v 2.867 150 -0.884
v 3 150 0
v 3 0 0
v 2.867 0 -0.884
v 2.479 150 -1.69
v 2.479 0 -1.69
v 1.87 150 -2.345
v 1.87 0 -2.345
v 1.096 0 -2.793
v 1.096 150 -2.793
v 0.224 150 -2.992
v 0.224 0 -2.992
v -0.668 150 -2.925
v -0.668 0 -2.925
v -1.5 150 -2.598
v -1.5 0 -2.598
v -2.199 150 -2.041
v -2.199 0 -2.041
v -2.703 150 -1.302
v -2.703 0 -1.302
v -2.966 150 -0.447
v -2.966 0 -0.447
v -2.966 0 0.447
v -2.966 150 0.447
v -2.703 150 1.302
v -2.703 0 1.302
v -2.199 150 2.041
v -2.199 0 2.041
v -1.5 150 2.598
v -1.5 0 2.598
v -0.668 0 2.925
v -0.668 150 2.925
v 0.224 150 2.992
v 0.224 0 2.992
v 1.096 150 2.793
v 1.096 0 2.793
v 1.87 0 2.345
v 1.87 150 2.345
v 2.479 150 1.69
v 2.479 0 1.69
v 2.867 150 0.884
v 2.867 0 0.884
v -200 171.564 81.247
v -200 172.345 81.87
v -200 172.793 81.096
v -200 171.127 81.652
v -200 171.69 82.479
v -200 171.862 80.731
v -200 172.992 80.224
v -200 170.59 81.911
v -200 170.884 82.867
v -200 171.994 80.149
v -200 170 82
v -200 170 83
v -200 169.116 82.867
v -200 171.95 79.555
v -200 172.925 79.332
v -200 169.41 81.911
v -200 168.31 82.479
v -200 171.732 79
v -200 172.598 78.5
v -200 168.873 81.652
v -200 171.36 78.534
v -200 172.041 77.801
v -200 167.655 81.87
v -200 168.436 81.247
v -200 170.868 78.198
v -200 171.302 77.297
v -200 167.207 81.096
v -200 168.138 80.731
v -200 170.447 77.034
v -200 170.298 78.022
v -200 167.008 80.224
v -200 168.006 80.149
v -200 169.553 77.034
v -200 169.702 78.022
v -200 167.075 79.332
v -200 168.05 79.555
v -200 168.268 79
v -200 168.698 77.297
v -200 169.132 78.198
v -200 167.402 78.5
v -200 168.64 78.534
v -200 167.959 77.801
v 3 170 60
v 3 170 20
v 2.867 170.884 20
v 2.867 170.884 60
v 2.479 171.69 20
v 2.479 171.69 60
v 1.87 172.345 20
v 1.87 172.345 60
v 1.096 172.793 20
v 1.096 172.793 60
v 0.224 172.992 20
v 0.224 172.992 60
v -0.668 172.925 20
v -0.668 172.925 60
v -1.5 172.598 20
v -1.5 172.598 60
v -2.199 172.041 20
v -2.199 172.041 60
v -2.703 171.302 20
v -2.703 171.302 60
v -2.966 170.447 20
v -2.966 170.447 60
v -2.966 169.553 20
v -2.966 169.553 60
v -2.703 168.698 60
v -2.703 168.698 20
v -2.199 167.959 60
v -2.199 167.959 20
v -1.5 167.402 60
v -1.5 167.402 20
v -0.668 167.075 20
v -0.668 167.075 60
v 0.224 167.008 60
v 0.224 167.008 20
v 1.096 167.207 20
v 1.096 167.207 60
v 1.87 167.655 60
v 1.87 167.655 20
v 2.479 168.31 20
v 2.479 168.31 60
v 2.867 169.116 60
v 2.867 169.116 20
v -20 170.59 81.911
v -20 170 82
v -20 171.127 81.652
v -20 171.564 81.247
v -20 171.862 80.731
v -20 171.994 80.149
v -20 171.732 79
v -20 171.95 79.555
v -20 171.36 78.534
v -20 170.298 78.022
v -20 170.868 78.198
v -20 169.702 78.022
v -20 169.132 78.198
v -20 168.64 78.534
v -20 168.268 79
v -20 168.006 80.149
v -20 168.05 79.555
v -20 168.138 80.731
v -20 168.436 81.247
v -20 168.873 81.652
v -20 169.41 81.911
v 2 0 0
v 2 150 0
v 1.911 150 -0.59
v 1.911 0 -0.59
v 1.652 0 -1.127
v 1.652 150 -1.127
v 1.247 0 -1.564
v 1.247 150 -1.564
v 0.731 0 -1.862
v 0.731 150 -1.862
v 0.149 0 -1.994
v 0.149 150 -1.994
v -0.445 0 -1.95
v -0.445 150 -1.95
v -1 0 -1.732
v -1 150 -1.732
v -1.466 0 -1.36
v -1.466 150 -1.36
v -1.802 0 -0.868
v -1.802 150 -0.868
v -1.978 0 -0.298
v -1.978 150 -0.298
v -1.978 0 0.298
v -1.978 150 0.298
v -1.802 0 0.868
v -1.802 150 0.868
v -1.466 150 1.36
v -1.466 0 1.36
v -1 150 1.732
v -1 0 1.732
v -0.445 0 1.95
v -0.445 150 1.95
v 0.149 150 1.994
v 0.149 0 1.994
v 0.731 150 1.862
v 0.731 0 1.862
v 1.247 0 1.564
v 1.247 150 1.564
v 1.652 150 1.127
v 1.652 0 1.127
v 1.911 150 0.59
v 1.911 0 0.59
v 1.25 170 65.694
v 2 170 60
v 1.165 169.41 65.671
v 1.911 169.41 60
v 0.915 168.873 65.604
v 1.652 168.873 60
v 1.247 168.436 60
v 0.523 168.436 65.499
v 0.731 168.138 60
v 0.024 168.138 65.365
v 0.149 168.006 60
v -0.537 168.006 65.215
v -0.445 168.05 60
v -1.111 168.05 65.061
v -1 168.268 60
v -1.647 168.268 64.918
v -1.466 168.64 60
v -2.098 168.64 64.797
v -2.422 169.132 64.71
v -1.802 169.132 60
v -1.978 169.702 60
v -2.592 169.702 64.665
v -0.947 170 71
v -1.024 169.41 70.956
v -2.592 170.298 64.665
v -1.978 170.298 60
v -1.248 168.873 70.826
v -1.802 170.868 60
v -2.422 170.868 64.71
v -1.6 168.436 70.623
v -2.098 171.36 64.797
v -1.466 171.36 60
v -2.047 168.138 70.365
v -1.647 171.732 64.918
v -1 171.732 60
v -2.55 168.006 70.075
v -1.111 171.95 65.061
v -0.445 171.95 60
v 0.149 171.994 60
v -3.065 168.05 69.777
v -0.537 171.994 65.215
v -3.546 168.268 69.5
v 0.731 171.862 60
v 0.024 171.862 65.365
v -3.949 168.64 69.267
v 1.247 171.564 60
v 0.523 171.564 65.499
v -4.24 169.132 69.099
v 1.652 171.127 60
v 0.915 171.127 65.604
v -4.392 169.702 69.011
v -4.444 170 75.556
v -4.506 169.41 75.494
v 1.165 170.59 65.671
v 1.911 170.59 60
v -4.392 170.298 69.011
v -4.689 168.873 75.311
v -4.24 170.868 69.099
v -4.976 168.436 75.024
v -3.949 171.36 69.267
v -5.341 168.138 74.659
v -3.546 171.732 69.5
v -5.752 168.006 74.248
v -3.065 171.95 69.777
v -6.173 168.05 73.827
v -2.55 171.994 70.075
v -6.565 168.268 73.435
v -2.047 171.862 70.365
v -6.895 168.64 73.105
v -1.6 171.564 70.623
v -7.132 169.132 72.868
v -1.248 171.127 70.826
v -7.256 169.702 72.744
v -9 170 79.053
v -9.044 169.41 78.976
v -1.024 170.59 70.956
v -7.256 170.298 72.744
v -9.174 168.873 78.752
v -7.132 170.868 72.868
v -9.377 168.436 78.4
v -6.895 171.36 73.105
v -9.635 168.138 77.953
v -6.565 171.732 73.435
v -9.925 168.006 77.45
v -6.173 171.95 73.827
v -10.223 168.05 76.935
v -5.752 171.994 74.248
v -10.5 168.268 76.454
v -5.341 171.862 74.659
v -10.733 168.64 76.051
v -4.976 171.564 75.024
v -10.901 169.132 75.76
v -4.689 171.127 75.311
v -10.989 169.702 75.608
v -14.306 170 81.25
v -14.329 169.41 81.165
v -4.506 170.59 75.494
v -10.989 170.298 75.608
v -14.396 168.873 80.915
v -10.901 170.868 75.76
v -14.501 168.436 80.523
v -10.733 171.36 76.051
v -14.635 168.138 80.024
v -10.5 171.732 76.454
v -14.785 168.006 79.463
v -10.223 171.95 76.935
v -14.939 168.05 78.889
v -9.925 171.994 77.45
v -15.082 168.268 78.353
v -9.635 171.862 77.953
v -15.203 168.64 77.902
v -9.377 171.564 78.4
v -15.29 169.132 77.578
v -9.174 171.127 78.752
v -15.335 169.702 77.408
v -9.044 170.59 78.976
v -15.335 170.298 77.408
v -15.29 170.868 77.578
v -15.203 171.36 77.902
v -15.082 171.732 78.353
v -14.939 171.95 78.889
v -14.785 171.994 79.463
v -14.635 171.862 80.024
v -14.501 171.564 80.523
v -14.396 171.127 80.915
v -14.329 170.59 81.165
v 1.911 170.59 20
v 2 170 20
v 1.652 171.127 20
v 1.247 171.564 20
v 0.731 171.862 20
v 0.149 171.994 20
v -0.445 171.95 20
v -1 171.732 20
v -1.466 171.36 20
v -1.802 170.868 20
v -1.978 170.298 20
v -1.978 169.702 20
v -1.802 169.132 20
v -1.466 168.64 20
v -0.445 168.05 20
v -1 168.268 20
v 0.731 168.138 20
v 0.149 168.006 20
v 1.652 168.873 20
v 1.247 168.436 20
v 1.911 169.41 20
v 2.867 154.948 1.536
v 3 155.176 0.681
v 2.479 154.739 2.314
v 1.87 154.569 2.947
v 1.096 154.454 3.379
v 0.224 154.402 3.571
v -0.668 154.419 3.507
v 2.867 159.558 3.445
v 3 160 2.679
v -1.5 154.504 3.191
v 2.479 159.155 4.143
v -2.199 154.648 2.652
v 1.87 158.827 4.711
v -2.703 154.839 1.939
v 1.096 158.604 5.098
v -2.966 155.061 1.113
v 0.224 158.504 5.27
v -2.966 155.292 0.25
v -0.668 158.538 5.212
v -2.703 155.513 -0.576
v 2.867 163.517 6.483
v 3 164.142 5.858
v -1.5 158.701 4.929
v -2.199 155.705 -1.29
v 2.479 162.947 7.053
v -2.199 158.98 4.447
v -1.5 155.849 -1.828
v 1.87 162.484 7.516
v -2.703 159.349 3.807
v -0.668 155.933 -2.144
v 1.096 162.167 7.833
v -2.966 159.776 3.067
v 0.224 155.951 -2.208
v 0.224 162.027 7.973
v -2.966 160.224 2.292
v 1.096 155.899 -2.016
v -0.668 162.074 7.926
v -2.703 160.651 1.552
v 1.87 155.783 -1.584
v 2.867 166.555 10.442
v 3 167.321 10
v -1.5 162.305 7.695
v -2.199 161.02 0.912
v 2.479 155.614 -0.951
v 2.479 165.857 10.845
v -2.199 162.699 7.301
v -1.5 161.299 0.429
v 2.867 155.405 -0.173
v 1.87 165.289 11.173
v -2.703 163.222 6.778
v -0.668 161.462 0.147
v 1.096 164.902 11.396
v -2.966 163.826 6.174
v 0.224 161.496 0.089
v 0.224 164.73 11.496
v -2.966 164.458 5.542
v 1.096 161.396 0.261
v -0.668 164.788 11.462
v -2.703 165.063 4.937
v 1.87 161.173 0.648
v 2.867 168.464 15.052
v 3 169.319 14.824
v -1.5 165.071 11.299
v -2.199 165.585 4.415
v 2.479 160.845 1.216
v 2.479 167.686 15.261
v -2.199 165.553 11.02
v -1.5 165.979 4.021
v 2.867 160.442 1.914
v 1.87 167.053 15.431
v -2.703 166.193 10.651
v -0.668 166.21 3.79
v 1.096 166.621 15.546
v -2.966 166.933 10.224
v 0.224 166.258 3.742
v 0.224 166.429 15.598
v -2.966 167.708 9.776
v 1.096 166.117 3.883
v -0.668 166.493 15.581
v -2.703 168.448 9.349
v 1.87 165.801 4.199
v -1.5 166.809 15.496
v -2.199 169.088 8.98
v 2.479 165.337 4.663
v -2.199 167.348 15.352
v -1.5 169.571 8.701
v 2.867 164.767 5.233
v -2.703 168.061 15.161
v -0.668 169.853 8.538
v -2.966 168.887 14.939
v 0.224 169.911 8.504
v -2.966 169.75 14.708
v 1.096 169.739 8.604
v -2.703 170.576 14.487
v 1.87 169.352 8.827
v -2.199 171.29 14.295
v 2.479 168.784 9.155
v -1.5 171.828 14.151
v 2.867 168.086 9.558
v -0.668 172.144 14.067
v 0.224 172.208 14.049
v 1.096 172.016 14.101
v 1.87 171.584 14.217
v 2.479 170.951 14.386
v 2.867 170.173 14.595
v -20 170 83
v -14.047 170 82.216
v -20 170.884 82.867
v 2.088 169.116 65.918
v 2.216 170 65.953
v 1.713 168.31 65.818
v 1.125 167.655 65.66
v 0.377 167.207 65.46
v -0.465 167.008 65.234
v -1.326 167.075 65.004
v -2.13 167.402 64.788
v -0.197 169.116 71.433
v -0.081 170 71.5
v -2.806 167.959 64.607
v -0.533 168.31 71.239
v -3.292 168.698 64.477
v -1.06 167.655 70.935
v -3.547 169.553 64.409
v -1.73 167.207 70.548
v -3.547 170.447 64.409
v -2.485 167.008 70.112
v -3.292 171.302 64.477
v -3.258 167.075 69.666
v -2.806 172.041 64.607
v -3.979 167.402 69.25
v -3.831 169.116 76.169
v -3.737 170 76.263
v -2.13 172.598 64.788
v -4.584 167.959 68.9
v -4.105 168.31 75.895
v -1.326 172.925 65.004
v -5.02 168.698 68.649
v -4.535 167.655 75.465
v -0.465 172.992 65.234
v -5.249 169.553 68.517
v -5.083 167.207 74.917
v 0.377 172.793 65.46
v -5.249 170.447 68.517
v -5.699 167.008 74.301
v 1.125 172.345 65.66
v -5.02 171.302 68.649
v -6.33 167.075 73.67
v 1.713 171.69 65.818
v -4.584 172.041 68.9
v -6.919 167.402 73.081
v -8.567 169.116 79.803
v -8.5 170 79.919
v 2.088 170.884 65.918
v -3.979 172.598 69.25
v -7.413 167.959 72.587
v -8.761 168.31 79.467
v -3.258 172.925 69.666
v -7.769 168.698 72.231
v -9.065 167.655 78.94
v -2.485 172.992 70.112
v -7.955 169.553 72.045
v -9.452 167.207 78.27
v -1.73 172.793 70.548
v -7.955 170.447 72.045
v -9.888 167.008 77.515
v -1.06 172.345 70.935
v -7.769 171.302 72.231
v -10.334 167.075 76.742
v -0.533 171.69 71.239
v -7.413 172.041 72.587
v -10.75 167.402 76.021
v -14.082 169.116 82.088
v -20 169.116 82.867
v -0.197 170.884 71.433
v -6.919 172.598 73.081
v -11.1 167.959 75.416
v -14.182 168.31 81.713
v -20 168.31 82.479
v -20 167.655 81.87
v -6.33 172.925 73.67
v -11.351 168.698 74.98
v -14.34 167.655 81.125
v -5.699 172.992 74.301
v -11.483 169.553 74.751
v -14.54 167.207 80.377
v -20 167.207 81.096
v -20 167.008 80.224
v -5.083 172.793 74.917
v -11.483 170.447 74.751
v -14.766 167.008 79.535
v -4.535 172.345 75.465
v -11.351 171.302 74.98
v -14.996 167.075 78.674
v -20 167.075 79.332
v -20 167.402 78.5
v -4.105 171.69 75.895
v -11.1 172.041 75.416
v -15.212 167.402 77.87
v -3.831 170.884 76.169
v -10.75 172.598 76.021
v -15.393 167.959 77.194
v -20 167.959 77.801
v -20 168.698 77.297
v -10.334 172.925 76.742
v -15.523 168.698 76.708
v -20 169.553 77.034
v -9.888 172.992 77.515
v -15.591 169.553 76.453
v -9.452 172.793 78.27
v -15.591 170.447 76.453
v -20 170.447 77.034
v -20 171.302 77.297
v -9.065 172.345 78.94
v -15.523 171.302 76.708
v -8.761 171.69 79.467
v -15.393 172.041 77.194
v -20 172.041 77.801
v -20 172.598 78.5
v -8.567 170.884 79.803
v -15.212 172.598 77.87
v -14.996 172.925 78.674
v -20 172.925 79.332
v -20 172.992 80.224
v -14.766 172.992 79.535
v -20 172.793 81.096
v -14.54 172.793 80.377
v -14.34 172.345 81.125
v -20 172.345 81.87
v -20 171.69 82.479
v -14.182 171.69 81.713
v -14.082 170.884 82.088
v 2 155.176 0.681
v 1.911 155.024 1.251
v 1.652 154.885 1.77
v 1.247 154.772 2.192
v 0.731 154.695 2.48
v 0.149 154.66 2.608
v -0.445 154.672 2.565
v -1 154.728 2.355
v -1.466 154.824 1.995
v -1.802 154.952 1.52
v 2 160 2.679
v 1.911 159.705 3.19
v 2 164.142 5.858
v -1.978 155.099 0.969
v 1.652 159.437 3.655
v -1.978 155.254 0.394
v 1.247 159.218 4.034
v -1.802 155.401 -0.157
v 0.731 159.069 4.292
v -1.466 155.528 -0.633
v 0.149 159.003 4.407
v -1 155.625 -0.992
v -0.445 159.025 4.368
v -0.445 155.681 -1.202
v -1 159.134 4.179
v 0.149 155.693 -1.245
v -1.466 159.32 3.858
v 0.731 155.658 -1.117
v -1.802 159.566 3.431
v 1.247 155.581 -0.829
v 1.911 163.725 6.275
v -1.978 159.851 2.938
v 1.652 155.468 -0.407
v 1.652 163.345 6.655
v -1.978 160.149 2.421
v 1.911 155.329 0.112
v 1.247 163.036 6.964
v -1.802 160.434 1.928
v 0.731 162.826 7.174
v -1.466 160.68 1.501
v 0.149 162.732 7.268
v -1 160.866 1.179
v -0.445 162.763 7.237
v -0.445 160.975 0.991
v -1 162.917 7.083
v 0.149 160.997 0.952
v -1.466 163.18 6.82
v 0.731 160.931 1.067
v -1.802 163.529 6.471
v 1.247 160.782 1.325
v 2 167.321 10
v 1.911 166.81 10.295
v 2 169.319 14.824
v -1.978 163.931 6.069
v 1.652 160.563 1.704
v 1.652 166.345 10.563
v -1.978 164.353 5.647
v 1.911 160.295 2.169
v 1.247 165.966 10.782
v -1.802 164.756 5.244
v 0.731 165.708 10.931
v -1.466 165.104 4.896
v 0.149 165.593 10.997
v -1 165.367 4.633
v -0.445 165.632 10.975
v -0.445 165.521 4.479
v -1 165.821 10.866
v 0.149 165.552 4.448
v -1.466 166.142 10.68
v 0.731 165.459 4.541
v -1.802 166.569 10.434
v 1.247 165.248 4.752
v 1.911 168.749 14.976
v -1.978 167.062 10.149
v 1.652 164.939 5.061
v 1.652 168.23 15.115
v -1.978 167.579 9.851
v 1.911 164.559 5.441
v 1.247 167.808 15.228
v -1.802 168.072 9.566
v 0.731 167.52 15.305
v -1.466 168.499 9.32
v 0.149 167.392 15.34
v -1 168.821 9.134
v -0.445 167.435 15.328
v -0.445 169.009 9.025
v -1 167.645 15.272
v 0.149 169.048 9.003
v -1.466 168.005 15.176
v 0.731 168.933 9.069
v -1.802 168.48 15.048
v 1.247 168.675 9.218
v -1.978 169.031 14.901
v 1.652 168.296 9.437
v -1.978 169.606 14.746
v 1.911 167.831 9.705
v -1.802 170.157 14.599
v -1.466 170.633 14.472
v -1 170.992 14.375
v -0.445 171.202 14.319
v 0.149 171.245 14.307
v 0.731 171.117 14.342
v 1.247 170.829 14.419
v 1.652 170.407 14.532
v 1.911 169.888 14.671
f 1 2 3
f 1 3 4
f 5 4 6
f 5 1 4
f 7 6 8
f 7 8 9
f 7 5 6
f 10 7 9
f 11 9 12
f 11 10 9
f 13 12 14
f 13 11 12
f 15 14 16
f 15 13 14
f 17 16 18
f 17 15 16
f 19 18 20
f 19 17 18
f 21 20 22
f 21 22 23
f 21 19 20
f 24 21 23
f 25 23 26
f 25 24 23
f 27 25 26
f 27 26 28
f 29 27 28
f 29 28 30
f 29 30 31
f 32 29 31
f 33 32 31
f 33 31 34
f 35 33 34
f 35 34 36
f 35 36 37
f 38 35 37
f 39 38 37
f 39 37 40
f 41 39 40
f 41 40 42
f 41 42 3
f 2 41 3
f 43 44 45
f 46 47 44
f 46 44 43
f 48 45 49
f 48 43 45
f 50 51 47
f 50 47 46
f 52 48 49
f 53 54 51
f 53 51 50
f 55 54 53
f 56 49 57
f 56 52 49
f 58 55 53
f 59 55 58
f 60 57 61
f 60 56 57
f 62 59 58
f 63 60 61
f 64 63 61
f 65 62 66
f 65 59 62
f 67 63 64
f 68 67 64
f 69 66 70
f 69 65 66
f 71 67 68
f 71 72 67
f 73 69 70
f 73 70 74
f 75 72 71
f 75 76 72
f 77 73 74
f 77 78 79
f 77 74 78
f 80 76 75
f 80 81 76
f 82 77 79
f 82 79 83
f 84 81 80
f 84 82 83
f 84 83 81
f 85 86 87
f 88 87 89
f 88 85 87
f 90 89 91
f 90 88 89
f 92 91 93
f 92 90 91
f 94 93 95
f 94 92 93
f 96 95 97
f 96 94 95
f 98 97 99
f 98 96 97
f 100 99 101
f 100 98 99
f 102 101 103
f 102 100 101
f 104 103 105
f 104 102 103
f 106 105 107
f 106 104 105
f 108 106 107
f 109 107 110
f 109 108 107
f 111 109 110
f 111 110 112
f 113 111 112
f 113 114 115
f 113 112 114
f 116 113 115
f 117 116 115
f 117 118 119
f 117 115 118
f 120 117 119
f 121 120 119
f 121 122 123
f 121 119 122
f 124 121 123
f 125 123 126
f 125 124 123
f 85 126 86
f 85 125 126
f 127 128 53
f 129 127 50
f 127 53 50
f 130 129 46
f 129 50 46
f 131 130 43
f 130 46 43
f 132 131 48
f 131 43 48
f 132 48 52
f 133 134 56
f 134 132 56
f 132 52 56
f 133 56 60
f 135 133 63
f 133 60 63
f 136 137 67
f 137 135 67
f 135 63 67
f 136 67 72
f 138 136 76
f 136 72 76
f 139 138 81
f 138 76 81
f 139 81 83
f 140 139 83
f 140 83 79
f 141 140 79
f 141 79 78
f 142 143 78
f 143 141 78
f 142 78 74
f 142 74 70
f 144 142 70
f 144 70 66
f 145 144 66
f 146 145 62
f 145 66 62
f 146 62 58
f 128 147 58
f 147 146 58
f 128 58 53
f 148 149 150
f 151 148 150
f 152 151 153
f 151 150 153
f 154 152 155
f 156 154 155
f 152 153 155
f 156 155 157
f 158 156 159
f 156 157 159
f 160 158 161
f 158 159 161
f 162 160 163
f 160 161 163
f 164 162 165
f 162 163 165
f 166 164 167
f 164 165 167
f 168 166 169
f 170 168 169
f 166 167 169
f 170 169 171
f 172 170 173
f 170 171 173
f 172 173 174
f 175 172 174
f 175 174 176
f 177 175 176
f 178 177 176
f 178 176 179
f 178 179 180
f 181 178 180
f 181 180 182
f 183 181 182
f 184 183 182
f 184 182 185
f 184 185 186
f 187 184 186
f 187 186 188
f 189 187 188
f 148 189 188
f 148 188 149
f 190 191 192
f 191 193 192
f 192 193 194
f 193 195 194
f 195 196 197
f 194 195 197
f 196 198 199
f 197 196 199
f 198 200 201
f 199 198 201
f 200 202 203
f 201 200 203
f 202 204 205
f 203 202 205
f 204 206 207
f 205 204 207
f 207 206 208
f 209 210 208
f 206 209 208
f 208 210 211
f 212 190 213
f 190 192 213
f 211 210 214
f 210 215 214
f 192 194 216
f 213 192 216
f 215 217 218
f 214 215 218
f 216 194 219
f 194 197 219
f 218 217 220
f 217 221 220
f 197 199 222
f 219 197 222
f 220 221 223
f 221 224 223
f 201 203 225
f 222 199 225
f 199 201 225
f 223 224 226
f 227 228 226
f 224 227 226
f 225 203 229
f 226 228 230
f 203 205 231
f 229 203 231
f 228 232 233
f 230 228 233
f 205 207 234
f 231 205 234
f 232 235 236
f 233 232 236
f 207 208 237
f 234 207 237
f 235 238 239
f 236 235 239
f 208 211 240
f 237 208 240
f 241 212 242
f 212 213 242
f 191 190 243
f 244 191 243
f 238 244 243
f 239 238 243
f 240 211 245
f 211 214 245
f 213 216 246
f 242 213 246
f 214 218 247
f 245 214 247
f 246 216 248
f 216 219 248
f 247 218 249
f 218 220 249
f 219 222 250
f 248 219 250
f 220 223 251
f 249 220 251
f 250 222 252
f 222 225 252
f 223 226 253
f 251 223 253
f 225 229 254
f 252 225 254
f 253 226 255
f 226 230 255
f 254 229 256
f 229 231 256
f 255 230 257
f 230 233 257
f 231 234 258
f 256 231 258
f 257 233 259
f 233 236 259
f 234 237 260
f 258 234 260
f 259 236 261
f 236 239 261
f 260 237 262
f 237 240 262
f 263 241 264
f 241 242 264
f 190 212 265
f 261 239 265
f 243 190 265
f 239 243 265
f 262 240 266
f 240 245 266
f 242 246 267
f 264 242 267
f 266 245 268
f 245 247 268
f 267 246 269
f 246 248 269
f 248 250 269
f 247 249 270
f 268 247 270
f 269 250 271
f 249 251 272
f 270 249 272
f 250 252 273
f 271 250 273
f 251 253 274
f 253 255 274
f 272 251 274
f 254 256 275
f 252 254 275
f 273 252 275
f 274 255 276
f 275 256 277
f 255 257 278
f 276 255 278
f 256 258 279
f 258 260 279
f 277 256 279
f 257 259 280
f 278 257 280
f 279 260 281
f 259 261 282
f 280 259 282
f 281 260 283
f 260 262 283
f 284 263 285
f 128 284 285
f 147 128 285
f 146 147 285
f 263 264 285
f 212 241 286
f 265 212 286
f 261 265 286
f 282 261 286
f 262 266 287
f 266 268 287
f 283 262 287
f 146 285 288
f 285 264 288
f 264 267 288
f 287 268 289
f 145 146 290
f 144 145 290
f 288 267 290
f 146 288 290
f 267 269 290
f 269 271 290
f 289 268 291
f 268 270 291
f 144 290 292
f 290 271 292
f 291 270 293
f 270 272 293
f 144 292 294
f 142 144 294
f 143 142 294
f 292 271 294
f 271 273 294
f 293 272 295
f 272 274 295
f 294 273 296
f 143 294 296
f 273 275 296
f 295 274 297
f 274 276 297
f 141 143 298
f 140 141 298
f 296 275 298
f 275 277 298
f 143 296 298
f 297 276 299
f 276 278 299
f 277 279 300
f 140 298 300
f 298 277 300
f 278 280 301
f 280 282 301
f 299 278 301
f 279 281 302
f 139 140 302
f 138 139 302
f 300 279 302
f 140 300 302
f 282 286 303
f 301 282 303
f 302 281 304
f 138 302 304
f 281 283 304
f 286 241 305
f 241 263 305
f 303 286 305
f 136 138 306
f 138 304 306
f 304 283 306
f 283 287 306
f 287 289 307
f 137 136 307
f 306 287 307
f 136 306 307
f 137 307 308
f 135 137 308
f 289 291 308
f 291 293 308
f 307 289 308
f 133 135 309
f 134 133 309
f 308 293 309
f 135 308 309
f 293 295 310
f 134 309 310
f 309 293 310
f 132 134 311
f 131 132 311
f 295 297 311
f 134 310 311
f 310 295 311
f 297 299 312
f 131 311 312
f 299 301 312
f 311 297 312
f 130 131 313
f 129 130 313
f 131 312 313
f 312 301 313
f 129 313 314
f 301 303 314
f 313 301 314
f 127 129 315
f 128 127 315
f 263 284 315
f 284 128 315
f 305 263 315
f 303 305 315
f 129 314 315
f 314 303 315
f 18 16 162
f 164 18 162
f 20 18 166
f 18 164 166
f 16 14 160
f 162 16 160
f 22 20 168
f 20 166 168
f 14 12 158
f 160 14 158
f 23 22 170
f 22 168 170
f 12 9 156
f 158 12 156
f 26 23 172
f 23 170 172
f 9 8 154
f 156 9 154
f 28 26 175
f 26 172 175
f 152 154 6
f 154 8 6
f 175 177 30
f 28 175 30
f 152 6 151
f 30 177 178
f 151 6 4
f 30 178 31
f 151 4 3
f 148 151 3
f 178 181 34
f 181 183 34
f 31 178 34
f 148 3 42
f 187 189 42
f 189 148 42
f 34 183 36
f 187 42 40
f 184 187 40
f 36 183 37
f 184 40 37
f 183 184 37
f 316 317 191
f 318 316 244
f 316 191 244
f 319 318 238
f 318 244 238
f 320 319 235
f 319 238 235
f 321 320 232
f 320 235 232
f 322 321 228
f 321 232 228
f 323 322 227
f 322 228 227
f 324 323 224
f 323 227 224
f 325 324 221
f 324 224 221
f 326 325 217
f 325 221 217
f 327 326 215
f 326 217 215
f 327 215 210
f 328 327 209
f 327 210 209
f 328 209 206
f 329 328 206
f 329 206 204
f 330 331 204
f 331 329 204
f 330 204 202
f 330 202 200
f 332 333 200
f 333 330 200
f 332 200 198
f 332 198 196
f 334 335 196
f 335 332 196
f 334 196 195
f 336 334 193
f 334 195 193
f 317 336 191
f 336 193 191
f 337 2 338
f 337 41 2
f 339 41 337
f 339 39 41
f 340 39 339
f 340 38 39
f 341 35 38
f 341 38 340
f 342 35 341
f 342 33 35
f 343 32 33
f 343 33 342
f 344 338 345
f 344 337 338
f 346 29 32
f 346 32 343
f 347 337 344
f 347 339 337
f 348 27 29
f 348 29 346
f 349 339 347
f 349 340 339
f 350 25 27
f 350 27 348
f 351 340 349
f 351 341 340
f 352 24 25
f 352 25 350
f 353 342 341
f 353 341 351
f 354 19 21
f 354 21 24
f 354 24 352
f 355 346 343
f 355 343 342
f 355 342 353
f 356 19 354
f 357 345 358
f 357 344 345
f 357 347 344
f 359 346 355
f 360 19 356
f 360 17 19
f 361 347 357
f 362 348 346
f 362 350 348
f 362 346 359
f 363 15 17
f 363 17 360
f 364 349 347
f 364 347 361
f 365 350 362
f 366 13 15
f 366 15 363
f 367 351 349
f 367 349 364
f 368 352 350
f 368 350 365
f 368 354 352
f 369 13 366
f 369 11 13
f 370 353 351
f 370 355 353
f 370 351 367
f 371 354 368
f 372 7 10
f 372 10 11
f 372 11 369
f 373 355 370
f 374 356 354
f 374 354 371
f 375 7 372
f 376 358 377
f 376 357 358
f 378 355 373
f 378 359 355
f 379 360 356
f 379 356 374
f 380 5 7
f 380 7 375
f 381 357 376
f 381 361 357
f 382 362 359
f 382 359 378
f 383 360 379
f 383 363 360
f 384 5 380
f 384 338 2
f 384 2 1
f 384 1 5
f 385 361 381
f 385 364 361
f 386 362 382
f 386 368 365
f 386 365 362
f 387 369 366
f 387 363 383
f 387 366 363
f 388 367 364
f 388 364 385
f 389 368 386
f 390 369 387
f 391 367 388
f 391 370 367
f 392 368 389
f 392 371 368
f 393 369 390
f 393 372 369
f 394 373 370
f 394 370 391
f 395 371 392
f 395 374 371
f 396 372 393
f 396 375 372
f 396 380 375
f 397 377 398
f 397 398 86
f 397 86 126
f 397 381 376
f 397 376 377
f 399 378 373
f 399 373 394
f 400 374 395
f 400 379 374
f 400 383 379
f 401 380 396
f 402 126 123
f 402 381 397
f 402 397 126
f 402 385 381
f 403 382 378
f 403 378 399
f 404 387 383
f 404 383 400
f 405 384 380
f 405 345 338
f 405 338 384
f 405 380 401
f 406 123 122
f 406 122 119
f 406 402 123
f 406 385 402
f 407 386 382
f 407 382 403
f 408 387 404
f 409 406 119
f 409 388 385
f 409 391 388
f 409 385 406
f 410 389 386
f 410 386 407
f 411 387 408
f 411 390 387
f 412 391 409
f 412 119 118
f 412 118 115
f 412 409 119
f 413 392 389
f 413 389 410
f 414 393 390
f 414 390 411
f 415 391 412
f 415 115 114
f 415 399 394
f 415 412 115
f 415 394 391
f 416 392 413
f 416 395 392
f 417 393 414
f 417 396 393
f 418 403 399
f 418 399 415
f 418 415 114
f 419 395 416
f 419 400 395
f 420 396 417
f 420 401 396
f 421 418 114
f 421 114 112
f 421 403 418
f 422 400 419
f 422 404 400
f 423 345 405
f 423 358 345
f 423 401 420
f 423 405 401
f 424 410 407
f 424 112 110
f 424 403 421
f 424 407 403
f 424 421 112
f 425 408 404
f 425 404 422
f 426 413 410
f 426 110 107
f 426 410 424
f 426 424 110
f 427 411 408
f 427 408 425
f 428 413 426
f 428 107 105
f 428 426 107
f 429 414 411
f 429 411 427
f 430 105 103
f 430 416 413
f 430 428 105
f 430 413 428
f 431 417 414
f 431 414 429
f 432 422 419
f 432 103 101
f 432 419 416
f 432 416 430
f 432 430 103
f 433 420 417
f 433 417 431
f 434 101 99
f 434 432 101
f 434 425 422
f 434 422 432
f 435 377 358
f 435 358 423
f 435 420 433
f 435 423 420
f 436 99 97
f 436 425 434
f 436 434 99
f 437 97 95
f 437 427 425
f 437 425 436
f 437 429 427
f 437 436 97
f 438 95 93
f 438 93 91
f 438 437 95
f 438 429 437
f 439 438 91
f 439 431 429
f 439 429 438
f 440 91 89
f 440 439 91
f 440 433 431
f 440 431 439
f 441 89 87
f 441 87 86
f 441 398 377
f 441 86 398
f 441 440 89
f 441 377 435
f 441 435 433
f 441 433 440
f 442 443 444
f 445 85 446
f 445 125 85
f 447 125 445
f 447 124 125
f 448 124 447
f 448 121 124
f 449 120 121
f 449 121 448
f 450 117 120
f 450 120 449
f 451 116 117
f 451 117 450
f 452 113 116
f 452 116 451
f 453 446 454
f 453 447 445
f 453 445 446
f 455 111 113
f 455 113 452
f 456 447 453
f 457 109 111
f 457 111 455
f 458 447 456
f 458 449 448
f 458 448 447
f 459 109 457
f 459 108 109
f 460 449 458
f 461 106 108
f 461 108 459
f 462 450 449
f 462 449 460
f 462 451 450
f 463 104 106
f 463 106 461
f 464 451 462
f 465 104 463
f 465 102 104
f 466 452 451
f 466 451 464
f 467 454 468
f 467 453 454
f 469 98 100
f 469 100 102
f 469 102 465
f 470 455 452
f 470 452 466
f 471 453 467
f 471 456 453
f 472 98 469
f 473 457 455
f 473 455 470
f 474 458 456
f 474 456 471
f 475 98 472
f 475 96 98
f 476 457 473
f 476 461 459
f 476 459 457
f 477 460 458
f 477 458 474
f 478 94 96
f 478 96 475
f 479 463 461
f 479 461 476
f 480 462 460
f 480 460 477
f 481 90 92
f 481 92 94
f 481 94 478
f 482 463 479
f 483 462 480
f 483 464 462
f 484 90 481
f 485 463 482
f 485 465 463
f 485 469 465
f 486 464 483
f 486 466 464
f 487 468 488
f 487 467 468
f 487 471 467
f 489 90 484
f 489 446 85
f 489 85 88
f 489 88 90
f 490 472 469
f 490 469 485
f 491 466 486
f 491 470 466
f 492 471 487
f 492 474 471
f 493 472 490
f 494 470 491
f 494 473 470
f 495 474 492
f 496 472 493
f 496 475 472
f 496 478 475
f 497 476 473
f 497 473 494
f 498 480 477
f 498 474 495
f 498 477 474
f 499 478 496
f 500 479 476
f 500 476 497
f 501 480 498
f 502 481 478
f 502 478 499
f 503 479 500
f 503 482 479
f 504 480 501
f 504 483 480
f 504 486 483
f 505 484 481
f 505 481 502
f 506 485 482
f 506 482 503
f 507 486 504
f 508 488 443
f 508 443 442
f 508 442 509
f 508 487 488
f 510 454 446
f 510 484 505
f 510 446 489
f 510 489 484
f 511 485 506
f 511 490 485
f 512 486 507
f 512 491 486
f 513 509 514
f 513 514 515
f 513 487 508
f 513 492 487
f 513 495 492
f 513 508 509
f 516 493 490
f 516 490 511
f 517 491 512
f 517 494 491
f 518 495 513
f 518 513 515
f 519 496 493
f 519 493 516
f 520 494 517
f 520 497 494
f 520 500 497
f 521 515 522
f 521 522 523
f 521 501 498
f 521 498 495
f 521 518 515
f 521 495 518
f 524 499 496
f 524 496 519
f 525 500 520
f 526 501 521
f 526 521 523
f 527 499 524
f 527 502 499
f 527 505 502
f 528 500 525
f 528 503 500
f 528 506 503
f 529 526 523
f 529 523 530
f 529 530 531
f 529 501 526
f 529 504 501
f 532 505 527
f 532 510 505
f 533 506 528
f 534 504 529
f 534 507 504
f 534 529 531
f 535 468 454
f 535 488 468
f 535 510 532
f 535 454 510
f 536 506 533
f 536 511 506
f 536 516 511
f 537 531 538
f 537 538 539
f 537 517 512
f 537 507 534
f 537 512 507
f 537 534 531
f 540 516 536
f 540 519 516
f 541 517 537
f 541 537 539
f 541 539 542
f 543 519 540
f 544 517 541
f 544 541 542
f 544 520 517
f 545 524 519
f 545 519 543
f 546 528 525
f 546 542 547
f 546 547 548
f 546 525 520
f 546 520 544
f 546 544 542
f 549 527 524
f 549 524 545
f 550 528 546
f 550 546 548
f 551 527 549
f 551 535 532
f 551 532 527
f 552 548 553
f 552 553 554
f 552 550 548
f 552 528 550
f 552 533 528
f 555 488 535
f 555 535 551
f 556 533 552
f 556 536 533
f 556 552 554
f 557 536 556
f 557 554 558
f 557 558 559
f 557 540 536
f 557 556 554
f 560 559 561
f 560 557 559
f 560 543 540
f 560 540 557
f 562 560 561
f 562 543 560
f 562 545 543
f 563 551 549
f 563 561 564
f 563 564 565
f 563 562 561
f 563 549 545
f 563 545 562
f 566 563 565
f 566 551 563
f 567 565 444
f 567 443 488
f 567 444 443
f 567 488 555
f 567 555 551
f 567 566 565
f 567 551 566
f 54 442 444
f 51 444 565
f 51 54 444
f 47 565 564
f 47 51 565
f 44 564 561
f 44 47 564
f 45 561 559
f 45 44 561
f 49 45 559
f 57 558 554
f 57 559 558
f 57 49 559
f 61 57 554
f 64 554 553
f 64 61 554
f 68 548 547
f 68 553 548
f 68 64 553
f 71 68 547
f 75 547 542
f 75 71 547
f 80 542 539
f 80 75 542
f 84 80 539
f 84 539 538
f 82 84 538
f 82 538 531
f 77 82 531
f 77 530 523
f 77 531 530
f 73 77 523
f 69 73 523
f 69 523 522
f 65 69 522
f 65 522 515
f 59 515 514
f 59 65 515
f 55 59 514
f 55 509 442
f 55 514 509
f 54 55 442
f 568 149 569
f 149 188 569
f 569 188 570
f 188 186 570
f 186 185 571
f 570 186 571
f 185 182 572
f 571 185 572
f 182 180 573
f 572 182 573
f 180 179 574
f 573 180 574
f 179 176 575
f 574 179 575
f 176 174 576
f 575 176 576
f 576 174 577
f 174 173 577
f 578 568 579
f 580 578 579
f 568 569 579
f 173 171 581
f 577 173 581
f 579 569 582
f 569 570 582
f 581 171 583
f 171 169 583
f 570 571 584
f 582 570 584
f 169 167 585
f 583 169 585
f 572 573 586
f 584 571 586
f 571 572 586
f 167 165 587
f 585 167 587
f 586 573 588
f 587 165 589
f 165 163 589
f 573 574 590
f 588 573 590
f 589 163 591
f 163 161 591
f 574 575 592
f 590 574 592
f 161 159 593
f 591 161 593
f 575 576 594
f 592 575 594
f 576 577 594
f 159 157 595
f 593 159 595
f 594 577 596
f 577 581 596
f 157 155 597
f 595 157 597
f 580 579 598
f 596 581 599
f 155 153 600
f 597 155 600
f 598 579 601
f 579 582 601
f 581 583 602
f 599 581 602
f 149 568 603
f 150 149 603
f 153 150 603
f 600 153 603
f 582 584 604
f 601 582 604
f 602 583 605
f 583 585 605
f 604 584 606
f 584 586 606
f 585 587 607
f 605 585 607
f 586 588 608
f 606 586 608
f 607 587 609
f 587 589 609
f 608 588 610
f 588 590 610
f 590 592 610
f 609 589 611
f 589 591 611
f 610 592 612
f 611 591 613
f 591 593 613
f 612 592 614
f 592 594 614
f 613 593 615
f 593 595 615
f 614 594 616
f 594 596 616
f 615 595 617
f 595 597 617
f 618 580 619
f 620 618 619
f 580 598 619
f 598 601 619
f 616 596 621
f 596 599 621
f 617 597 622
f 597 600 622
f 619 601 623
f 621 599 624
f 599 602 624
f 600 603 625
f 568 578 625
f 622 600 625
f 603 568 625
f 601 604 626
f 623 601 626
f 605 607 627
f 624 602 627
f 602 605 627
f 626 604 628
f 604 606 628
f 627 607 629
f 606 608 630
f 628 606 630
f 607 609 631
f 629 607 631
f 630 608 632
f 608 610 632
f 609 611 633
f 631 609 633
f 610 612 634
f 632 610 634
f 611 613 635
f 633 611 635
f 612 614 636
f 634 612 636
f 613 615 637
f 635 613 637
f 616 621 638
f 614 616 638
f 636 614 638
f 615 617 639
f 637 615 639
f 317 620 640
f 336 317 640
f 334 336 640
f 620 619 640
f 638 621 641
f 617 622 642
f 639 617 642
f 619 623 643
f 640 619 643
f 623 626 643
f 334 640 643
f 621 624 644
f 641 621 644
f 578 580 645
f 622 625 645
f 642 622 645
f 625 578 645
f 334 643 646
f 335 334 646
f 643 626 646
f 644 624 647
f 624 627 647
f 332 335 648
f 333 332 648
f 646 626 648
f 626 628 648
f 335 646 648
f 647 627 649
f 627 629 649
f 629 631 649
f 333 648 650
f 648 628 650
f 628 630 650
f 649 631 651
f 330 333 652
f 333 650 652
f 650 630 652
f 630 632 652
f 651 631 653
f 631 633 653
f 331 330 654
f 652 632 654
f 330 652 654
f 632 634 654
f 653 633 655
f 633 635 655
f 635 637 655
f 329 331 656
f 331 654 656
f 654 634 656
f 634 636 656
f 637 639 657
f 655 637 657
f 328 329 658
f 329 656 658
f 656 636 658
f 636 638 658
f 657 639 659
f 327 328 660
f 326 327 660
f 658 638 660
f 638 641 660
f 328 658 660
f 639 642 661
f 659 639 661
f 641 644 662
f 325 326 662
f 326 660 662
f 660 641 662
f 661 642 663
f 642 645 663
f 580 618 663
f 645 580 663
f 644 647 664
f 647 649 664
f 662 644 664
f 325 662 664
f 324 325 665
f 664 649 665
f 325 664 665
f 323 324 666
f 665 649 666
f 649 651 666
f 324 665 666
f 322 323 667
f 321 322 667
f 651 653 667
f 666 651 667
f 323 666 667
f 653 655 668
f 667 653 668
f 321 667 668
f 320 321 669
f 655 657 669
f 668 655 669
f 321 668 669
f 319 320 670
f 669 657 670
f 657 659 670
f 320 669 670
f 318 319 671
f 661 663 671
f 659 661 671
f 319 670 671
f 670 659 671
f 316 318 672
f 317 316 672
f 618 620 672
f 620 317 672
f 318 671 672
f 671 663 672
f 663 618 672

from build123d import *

# Parameters (mm, degrees)
ESQUISSE2_R   = 3
ESQUISSE2_R_2 = 2


with BuildPart() as part:
    # Balayage1: sweep along a curve in space
    with BuildLine() as balayage1_path:
        Line((0, 0, 0), (0, 150, 0))
        ThreePointArc((0, 150, 0), (0, 164.142135624, 5.857864376), (0, 170, 20))
        Line((0, 170, 20), (0, 170, 60))
        ThreePointArc((0, 170, 60), (-5.857864376, 170, 74.142135624), (-20, 170, 80))
        Line((-20, 170, 80), (-200, 170, 80))
    # Esquisse2 → Balayage1 (sweep)
    with BuildSketch(Plane(origin=(0, 0, 0), x_dir=(1, 0, 0), z_dir=(0, 1, 0))):
        Circle(ESQUISSE2_R)
        Circle(ESQUISSE2_R_2, mode=Mode.SUBTRACT)
    sweep(path=balayage1_path.line)


solid = part.part
